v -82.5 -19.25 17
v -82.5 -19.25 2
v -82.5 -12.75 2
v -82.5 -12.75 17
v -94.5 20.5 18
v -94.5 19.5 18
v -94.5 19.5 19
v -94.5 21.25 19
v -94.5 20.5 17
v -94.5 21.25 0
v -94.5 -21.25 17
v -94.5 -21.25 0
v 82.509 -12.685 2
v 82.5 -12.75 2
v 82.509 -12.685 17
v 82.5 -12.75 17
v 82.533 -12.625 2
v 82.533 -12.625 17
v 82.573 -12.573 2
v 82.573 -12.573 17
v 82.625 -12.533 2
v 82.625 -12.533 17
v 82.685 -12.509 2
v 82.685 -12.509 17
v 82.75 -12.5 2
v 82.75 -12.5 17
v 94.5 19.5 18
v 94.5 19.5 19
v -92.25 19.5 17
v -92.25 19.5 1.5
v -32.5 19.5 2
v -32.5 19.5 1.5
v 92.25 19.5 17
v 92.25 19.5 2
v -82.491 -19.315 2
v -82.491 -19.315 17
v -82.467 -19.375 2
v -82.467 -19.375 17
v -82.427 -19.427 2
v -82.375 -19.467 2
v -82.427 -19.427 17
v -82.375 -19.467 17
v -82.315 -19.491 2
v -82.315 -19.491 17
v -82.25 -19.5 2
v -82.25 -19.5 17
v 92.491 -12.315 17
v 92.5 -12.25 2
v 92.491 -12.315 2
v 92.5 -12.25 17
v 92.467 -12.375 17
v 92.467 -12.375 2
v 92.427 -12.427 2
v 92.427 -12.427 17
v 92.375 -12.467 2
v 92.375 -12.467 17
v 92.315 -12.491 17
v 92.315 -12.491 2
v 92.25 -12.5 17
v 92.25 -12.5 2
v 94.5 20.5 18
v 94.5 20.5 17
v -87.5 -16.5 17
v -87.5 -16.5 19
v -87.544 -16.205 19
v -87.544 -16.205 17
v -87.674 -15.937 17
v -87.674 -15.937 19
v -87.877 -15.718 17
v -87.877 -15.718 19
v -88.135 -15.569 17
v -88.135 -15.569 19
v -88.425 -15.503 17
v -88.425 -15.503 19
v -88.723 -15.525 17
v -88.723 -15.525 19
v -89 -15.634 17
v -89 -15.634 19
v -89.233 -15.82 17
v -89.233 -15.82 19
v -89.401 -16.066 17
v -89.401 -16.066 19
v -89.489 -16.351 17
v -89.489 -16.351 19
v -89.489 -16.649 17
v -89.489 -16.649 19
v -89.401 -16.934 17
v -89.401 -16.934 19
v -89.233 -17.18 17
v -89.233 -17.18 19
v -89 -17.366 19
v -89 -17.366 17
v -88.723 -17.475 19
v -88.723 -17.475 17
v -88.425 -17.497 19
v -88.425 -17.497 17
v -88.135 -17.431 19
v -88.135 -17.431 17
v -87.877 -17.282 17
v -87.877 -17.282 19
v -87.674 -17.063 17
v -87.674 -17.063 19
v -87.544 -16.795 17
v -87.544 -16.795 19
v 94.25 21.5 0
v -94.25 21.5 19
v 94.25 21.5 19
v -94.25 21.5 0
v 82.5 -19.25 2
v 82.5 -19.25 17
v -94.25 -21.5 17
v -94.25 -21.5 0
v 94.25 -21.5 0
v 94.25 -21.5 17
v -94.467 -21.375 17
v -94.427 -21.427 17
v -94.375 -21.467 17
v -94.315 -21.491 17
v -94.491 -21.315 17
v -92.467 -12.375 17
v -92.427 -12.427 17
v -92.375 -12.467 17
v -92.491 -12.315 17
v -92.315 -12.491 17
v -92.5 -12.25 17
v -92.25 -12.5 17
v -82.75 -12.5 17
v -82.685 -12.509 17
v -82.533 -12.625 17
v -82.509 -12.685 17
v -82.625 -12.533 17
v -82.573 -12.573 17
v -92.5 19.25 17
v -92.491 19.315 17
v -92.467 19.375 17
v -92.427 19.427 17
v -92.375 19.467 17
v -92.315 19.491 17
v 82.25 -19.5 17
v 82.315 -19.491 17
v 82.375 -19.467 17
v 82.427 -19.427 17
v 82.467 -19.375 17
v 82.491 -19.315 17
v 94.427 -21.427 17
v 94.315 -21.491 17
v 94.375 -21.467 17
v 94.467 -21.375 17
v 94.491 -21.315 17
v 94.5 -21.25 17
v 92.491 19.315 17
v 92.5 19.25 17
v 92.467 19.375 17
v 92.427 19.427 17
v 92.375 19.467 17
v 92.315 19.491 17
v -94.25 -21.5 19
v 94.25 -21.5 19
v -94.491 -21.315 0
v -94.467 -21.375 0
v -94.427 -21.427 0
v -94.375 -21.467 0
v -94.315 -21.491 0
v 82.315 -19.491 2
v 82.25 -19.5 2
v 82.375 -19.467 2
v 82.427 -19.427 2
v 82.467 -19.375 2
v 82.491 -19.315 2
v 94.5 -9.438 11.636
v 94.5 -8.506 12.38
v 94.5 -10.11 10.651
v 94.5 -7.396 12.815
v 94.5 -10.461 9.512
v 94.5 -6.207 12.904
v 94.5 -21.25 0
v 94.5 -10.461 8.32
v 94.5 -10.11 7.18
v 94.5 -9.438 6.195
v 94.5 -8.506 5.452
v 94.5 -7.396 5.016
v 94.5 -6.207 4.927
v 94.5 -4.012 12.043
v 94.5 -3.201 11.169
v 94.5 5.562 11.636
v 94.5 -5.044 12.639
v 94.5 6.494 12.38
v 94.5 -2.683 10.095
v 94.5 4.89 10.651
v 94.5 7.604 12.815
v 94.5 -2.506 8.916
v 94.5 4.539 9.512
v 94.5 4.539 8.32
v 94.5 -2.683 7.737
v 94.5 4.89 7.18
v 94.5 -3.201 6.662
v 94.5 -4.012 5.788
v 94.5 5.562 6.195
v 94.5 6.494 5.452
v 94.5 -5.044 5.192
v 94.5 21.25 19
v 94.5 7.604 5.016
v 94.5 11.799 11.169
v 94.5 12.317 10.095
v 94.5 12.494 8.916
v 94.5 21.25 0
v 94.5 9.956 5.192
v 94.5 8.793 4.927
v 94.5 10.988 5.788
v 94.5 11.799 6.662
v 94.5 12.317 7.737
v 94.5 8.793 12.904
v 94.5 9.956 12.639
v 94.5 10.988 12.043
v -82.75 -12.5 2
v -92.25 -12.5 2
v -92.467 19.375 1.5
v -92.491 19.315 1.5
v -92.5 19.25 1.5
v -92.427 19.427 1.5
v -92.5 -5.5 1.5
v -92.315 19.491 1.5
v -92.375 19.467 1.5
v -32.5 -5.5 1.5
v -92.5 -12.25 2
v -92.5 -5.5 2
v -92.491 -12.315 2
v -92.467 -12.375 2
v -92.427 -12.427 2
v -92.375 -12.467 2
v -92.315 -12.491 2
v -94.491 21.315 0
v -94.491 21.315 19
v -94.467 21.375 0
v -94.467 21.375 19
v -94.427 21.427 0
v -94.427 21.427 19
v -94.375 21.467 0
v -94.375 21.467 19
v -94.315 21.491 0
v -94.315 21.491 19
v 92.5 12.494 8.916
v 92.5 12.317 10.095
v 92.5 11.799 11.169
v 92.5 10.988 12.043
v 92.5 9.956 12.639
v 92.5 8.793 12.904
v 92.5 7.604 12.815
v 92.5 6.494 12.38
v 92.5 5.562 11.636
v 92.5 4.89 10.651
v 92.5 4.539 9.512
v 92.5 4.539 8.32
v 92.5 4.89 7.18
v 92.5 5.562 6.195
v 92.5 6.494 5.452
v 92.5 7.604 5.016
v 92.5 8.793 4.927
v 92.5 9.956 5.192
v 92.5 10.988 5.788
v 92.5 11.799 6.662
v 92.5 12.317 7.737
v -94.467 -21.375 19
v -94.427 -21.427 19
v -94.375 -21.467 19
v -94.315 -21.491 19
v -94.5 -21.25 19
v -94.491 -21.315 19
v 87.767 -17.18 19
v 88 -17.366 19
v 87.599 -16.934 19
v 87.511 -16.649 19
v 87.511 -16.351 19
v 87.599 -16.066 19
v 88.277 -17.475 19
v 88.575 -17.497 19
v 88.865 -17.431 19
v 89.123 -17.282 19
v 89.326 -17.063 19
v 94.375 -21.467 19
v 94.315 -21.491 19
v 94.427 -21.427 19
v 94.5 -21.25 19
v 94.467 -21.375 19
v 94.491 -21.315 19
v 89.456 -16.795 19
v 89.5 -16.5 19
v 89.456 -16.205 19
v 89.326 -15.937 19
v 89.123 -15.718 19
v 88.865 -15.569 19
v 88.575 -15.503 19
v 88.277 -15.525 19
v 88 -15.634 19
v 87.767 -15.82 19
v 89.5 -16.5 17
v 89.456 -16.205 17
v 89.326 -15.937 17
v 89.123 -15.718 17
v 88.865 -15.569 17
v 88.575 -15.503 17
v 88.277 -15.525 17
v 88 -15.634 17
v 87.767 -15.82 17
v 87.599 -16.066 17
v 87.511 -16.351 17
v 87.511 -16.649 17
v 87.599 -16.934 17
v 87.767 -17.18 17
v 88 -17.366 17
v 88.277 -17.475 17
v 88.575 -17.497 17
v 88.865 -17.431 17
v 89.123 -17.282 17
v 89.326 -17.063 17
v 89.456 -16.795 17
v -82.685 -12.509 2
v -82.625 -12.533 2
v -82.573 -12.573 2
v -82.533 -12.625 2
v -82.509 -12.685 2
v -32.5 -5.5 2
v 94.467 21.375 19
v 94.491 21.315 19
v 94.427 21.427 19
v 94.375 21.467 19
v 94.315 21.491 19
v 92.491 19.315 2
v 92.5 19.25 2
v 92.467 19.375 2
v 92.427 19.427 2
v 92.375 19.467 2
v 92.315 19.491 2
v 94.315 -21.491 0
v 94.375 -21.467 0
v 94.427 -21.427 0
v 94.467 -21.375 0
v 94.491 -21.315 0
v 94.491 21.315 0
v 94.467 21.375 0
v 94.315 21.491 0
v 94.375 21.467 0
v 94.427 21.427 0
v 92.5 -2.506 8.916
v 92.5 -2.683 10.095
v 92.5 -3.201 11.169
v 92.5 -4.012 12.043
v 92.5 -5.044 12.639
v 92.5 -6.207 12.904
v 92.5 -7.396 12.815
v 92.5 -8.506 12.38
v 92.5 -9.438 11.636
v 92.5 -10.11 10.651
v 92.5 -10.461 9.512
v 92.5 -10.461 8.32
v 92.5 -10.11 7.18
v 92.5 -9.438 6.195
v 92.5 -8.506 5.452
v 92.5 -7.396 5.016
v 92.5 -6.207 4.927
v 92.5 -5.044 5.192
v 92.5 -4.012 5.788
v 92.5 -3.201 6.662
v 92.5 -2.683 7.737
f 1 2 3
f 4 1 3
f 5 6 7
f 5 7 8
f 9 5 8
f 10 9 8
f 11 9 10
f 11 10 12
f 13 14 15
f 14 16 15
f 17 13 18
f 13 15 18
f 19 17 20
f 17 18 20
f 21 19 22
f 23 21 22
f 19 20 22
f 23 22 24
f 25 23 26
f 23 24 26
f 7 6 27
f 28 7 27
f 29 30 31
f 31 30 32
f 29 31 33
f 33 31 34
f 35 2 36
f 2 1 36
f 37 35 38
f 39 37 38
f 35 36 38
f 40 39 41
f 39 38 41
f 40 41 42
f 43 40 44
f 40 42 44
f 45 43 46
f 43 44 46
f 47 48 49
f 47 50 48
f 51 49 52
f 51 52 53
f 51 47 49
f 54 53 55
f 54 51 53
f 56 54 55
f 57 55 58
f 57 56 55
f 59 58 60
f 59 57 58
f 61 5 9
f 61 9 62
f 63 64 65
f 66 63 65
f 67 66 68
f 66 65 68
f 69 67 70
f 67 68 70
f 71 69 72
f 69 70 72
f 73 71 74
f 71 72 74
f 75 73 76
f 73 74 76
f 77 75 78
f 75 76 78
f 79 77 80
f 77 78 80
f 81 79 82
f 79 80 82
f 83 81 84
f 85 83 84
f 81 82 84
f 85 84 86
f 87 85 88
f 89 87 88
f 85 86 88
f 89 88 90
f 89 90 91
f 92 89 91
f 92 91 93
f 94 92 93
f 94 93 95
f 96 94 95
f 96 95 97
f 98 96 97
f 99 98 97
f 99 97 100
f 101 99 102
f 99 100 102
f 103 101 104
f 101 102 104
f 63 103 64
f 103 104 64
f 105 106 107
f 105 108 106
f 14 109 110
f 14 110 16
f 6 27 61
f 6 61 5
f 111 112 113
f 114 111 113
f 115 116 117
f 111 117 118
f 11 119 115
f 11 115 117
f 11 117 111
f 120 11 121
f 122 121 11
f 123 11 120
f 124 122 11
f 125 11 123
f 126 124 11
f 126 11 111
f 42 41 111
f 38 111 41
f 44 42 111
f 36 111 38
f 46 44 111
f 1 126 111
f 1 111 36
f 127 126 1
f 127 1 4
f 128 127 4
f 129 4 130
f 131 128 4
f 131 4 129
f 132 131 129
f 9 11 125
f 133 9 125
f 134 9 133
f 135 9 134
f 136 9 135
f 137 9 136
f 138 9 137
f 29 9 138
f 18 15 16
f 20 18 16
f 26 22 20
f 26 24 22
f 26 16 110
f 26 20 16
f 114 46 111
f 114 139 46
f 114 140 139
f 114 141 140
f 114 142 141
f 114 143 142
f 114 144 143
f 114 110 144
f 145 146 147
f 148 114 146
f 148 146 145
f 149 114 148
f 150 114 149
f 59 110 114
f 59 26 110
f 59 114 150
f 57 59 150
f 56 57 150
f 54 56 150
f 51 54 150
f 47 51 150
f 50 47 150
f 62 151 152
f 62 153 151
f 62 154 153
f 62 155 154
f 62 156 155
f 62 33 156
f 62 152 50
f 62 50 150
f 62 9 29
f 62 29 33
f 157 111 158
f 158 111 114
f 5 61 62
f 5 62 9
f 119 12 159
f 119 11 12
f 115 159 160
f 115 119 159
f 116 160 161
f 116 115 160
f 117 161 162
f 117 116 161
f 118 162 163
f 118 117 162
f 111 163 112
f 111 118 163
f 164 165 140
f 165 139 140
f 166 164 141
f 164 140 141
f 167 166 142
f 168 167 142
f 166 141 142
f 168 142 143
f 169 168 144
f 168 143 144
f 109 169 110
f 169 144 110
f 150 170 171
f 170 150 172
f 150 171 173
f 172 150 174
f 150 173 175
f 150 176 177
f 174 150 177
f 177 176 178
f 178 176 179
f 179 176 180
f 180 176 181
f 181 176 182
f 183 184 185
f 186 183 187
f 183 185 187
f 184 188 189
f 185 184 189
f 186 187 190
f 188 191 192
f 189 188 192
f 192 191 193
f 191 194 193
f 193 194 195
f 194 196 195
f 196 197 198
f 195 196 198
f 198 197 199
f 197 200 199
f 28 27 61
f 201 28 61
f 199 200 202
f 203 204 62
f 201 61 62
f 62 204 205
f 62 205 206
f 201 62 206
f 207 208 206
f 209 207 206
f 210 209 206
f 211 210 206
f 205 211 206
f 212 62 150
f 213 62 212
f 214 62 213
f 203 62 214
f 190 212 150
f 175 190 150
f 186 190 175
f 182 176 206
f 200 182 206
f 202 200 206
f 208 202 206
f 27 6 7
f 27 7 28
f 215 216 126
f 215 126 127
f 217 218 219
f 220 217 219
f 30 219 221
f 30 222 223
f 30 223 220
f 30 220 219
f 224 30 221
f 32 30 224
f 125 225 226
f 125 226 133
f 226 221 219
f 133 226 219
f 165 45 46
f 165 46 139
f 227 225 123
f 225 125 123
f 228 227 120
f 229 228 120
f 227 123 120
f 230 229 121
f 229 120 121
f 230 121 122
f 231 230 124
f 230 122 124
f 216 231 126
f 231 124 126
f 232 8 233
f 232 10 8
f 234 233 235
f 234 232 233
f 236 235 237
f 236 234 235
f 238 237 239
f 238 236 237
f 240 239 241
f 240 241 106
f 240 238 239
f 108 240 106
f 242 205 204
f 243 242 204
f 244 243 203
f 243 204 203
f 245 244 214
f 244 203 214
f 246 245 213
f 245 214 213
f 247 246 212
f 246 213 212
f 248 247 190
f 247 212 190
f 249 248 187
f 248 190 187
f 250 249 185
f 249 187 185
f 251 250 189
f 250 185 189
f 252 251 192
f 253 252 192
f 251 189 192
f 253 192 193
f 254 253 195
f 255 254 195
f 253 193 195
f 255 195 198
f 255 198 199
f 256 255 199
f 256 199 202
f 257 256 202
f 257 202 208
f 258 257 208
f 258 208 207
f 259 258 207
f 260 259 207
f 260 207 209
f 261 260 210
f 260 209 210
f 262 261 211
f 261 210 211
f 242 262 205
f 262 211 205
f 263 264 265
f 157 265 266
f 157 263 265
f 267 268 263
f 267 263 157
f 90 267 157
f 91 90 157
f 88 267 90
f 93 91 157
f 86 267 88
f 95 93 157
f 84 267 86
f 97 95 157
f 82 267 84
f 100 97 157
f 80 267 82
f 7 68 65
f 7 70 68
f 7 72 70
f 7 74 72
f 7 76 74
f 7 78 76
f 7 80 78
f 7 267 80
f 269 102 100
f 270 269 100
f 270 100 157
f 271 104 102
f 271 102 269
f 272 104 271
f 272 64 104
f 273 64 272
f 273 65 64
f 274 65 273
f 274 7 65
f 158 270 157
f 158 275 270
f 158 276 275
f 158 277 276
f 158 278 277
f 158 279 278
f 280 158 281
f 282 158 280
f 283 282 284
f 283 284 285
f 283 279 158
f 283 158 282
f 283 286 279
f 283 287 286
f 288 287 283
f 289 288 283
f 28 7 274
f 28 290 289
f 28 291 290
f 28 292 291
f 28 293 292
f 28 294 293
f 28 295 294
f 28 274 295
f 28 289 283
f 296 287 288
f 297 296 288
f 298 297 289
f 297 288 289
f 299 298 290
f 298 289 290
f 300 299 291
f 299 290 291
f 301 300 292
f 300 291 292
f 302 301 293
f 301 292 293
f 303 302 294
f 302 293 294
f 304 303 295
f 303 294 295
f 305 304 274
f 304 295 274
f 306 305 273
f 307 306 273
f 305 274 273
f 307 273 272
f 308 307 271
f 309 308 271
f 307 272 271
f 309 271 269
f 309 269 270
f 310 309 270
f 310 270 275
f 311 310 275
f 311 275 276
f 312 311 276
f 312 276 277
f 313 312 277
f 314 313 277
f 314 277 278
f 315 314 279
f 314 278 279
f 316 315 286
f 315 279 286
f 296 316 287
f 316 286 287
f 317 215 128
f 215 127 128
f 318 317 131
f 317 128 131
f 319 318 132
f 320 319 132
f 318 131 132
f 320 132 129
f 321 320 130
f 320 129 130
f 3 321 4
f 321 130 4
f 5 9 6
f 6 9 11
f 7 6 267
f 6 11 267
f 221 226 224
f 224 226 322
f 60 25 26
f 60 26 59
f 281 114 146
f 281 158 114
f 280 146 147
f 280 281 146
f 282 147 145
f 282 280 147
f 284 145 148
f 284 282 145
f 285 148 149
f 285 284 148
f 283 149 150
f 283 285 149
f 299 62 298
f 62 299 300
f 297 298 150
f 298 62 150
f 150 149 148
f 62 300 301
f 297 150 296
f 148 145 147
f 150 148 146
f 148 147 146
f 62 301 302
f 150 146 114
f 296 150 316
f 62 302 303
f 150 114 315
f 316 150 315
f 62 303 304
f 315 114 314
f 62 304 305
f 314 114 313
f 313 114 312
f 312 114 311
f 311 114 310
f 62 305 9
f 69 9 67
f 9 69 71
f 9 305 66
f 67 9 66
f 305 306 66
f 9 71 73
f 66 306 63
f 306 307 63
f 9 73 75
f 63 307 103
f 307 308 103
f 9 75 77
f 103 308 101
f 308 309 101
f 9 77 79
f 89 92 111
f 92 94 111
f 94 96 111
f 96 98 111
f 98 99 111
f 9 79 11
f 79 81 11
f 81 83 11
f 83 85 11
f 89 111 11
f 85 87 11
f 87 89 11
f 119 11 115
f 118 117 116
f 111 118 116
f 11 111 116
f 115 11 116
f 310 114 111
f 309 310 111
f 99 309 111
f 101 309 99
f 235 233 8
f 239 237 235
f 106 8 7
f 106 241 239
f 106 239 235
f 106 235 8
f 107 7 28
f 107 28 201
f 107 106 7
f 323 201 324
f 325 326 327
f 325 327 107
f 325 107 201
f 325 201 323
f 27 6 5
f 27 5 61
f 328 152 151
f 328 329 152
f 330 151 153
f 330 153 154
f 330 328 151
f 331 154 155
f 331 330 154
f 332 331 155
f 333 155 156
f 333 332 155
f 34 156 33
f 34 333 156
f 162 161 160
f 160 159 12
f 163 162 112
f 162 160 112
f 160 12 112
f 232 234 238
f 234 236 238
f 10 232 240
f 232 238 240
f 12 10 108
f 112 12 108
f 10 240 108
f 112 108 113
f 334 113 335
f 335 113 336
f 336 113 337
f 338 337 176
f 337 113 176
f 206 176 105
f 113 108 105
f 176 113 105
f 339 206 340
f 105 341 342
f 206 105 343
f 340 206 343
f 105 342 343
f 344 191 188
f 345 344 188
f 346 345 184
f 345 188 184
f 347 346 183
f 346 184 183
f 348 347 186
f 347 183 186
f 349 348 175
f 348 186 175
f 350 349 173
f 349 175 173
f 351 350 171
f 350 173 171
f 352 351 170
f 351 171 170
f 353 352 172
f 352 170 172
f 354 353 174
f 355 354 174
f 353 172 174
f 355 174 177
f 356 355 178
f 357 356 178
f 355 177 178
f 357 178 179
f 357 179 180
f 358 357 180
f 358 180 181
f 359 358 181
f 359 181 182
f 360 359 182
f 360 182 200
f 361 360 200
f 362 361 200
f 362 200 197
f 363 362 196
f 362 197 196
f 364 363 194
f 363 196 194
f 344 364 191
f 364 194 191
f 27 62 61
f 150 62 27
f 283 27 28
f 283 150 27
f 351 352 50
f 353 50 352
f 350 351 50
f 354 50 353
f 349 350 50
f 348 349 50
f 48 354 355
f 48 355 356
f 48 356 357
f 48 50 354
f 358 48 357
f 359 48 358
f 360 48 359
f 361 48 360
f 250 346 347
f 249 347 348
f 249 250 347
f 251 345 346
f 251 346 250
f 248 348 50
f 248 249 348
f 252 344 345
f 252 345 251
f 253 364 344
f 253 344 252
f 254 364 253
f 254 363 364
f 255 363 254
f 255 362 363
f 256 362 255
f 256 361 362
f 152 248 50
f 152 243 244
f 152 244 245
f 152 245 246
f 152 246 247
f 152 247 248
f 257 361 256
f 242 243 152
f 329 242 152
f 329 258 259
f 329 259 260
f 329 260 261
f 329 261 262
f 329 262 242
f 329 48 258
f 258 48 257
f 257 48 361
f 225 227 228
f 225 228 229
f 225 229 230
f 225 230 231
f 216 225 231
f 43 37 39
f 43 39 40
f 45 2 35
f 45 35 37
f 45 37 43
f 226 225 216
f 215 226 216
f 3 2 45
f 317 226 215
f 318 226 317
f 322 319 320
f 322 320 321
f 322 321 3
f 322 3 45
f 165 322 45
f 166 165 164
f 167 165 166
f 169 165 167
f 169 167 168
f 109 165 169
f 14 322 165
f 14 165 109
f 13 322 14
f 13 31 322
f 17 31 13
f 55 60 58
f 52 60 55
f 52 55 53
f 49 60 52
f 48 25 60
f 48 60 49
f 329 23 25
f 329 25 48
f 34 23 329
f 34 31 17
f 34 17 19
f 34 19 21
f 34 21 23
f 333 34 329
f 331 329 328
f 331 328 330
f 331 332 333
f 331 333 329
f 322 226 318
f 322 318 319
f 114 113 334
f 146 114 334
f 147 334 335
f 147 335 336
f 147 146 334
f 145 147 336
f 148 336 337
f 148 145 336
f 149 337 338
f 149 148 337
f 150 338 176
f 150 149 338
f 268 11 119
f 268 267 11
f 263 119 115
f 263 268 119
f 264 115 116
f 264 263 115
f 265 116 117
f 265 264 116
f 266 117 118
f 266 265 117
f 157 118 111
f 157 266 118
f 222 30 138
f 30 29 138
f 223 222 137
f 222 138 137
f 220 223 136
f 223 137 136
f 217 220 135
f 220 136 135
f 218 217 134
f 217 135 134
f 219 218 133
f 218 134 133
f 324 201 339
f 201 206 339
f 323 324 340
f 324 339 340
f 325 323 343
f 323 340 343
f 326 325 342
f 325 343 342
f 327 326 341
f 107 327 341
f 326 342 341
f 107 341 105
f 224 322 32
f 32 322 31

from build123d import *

# Parameters (mm, degrees)
F0_W      = 189
F0_H      = 43
F1_DEPTH  = 17
F2_T      = -2
F3_R      = 4
F4_DEPTH  = 2
F5_W      = 10
F5_H      = 7
F6_DEPTH  = 15
F7_W      = 189
F7_H      = 2
F8_DEPTH  = 2
F9_W      = 189
F9_H      = 1
F10_DEPTH = 1
F11_W     = 60
F11_H     = 25
F12_DEPTH = 0.5
F13_W     = 189
F13_H     = 41
F14_DEPTH = 2
F15_R     = 0.25
F16_R     = 0.25
F17_W     = 189
F17_H     = 1
F18_DEPTH = 1
F19_R     = 1
F20_DEPTH = 2


with BuildPart() as f1:
    # F0 (on Top) → F1 (new body)
    with BuildSketch(Plane.XY):
        Rectangle(F0_W, F0_H)
    extrude(amount=F1_DEPTH)

    # F2
    f2_openings = [f1.faces().sort_by_distance(p)[0] for p in [
        (0, 0, 17),
    ]]
    offset(amount=F2_T, openings=f2_openings)

    # F3 (on face) → F4 (cut, through all)
    with BuildSketch(Plane.YZ.offset(94.5)):
        with Locations((-6.5057606941, 8.915677325)):
            Circle(F3_R)
        with Locations((8.4942393059, 8.915677325)):
            Circle(F3_R)
    extrude(amount=-F4_DEPTH, mode=Mode.SUBTRACT)

    # F5 (on face) → F6 (join, through all)
    with BuildSketch(Plane.XY.offset(2)):
        with Locations((-87.5, -16)):
            Rectangle(F5_W, F5_H)
        with Locations((87.5, -16)):
            Rectangle(F5_W, F5_H)
    extrude(amount=F6_DEPTH)

    # F7 (on face) → F8 (join)
    with BuildSketch(Plane.XY.offset(17)):
        with Locations((0, 20.5)):
            Rectangle(F7_W, F7_H)
    extrude(amount=F8_DEPTH)

    # F9 (on face) → F10 (cut)
    with BuildSketch(Plane.XZ.offset(-19.5)):
        with Locations((0, 17.5)):
            Rectangle(F9_W, F9_H)
    extrude(amount=-F10_DEPTH, mode=Mode.SUBTRACT)

    # F11 (on face) → F12 (cut)
    with BuildSketch(Plane.XY.offset(2)):
        with Locations((-62.5, 7)):
            Rectangle(F11_W, F11_H)
    extrude(amount=-F12_DEPTH, mode=Mode.SUBTRACT)

    # F15
    f15_edges = [f1.edges().sort_by_distance(p)[0] for p in [
        (92.5, 19.5, 9.5),
        (82.5, -12.5, 9.5),
        (92.5, -12.5, 9.5),
        (82.5, -19.5, 9.5),
        (-92.5, 19.5, 9.25),
        (-82.5, -12.5, 9.5),
        (-82.5, -19.5, 9.5),
        (-92.5, -12.5, 9.5),
        (-94.5, -21.5, 8.5),
        (-94.5, 21.5, 9.5),
        (94.5, -21.5, 8.5),
        (94.5, 21.5, 9.5),
    ]]
    fillet(f15_edges, radius=F15_R)


with BuildPart() as f14:
    # F13 (on face) → F14 (new body)
    with BuildSketch(Plane.XY.offset(17)):
        with Locations((0, -1)):
            Rectangle(F13_W, F13_H)
    extrude(amount=F14_DEPTH)

    # F16
    f16_edges = [f14.edges().sort_by_distance(p)[0] for p in [
        (-94.5, -21.5, 18),
        (94.5, -21.5, 18),
    ]]
    fillet(f16_edges, radius=F16_R)

    # F17 (on face) → F18 (join)
    with BuildSketch(Plane(origin=(0, 19.5, 0), x_dir=(-1, 0, 0), z_dir=(0, 1, 0))):
        with Locations((0, 17.5)):
            Rectangle(F17_W, F17_H)
    extrude(amount=F18_DEPTH)

    # F19 (on face) → F20 (cut)
    with BuildSketch(Plane.XY.offset(19)):
        with Locations((-88.5, -16.5)):
            Circle(F19_R)
        with Locations((88.5, -16.5)):
            Circle(F19_R)
    extrude(amount=-F20_DEPTH, mode=Mode.SUBTRACT)


solid = Compound([f1.part, f14.part])
